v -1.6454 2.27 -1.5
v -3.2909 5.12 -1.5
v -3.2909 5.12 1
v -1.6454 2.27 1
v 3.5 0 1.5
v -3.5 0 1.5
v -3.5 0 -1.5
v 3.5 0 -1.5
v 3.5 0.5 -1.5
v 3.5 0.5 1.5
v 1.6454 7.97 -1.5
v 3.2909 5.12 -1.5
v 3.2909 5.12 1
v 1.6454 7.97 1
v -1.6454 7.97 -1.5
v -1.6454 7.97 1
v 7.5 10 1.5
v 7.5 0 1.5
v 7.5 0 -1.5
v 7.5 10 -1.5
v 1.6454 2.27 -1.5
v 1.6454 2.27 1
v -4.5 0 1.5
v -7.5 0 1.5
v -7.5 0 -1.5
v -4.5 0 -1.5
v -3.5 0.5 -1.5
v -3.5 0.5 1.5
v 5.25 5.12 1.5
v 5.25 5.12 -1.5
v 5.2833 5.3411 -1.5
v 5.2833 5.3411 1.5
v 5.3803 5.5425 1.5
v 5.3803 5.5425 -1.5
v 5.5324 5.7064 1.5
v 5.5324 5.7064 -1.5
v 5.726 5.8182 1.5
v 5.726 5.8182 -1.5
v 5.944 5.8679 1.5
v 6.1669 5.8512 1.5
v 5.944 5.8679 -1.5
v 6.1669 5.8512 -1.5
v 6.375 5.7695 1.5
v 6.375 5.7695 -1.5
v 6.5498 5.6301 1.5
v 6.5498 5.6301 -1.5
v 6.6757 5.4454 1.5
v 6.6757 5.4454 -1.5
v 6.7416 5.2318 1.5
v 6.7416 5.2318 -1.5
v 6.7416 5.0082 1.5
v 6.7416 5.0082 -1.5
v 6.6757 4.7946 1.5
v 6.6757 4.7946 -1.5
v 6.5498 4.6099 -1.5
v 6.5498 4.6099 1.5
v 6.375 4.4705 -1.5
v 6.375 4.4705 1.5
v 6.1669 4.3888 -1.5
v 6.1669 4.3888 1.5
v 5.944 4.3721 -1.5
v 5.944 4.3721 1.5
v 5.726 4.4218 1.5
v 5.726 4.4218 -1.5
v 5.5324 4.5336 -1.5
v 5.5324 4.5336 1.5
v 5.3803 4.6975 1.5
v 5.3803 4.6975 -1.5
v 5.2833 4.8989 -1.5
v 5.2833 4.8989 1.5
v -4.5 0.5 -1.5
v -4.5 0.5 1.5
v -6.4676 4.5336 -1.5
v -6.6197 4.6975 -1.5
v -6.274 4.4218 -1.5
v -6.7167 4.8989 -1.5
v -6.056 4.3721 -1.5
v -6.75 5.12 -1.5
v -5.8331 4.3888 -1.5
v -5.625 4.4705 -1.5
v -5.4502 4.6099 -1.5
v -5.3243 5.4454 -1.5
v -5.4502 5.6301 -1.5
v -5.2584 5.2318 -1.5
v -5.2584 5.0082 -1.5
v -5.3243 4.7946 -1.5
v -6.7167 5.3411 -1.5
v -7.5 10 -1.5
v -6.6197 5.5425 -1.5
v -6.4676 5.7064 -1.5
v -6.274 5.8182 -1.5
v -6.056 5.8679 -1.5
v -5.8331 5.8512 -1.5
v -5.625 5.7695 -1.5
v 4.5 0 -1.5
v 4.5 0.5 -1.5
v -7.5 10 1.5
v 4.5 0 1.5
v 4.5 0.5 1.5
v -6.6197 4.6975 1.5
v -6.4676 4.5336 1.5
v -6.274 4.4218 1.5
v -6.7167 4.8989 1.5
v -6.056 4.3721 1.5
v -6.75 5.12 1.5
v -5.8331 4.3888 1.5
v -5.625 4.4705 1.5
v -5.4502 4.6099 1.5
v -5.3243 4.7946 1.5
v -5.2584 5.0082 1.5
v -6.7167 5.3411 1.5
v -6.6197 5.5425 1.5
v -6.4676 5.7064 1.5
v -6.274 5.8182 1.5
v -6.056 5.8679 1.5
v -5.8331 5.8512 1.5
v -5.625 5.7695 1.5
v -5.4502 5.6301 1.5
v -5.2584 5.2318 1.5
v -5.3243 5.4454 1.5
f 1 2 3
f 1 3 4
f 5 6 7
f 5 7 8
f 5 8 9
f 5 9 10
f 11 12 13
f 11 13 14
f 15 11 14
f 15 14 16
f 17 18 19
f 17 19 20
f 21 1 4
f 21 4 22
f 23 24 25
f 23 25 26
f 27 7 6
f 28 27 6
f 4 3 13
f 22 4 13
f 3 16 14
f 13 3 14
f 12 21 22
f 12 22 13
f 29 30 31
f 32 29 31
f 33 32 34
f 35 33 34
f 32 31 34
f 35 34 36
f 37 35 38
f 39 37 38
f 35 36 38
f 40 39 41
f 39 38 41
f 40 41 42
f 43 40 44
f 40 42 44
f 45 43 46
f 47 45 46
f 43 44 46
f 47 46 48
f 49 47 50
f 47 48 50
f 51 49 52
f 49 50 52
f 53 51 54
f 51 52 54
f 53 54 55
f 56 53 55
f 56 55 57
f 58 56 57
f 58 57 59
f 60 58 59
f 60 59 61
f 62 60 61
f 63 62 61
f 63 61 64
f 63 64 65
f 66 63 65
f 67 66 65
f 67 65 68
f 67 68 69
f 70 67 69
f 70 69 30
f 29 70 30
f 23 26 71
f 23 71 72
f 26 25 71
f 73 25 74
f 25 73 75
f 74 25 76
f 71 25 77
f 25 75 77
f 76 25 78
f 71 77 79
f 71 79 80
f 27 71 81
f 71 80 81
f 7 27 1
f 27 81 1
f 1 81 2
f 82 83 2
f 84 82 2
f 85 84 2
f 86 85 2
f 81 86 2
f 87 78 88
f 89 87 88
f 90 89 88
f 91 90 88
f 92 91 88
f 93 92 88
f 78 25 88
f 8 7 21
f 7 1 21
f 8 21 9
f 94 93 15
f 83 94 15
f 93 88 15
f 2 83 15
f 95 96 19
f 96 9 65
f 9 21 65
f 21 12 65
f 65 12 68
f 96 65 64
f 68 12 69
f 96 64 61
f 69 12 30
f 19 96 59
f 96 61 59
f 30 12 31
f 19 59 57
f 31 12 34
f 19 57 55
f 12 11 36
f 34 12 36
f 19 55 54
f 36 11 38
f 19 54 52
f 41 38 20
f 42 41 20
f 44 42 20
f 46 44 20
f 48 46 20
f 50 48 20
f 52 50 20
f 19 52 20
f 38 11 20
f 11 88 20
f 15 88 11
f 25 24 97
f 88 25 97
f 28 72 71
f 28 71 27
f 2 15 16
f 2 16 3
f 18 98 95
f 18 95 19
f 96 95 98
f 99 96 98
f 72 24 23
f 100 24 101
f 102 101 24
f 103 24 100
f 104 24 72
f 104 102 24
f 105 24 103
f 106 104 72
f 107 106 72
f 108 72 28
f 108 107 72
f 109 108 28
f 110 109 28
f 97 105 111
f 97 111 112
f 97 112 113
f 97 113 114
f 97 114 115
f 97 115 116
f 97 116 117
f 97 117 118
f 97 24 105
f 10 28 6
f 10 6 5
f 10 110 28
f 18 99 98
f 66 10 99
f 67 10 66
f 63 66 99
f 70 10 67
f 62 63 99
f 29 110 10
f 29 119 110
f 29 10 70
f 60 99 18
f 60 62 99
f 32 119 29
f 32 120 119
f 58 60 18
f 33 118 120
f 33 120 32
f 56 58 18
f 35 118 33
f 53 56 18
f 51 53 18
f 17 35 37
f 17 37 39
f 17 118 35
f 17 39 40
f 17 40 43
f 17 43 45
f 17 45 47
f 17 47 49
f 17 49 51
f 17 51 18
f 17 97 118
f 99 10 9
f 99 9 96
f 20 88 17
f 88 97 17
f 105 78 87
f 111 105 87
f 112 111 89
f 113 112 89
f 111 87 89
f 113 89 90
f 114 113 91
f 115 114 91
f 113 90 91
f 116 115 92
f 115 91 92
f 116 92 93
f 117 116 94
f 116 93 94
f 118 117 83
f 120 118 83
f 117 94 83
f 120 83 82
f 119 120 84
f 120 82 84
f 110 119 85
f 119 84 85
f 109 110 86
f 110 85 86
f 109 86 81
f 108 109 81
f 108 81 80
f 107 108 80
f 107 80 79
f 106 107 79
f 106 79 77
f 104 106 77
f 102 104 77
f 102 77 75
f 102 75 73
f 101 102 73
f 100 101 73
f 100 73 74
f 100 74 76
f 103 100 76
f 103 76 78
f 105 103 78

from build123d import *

# Parameters (mm, degrees)
CROQUIS1_W                 = 15
CROQUIS1_H                 = 10
SALIENTE_EXTRUIR1_DEPTH    = 1.5
CORTAR_EXTRUIR2_DEPTH      = 1
CORTAR_EXTRUIR2_DEPTH_BACK = 13.589678312
CROQUIS4_W                 = 1
CROQUIS4_H                 = 3
CORTAR_EXTRUIR3_DEPTH      = 0.5
CROQUIS6_R                 = 0.75
CORTAR_EXTRUIR6_DEPTH      = 13.854960132


with BuildPart() as part:
    # Croquis1 → Saliente-Extruir1 (new, symmetric)
    with BuildSketch(Plane.XY):
        with Locations((0, 5)):
            Rectangle(CROQUIS1_W, CROQUIS1_H)
    extrude(amount=SALIENTE_EXTRUIR1_DEPTH, both=True)

    # Croquis3 → Cortar-Extruir2 (cut, two sides: drawn at the far end of the back side and taken through both)
    with BuildSketch(Plane.XY.offset(-CORTAR_EXTRUIR2_DEPTH_BACK)):
        Polygon((3.290896534, 5.12), (1.645448267, 7.97), (-1.645448267, 7.97), (-3.290896534, 5.12), (-1.645448267, 2.27), (1.645448267, 2.27), align=None)
    extrude(amount=CORTAR_EXTRUIR2_DEPTH + CORTAR_EXTRUIR2_DEPTH_BACK, mode=Mode.SUBTRACT)

    # Croquis4 → Cortar-Extruir3 (cut)
    with BuildSketch(Plane.XZ):
        with Locations((-4, 0)):
            Rectangle(CROQUIS4_W, CROQUIS4_H)
        with Locations((4, 0)):
            Rectangle(CROQUIS4_W, CROQUIS4_H)
    extrude(amount=-CORTAR_EXTRUIR3_DEPTH, mode=Mode.SUBTRACT)

    # Croquis6 → Cortar-Extruir6 (cut, through all)
    with BuildSketch(Plane(origin=(0, 0, -1.5), x_dir=(-1, 0, 0), z_dir=(0, 0, -1))):
        with Locations((-6, 5.12)):
            Circle(CROQUIS6_R)
        with Locations((6, 5.12)):
            Circle(CROQUIS6_R)
    extrude(amount=-CORTAR_EXTRUIR6_DEPTH, mode=Mode.SUBTRACT)


solid = part.part
